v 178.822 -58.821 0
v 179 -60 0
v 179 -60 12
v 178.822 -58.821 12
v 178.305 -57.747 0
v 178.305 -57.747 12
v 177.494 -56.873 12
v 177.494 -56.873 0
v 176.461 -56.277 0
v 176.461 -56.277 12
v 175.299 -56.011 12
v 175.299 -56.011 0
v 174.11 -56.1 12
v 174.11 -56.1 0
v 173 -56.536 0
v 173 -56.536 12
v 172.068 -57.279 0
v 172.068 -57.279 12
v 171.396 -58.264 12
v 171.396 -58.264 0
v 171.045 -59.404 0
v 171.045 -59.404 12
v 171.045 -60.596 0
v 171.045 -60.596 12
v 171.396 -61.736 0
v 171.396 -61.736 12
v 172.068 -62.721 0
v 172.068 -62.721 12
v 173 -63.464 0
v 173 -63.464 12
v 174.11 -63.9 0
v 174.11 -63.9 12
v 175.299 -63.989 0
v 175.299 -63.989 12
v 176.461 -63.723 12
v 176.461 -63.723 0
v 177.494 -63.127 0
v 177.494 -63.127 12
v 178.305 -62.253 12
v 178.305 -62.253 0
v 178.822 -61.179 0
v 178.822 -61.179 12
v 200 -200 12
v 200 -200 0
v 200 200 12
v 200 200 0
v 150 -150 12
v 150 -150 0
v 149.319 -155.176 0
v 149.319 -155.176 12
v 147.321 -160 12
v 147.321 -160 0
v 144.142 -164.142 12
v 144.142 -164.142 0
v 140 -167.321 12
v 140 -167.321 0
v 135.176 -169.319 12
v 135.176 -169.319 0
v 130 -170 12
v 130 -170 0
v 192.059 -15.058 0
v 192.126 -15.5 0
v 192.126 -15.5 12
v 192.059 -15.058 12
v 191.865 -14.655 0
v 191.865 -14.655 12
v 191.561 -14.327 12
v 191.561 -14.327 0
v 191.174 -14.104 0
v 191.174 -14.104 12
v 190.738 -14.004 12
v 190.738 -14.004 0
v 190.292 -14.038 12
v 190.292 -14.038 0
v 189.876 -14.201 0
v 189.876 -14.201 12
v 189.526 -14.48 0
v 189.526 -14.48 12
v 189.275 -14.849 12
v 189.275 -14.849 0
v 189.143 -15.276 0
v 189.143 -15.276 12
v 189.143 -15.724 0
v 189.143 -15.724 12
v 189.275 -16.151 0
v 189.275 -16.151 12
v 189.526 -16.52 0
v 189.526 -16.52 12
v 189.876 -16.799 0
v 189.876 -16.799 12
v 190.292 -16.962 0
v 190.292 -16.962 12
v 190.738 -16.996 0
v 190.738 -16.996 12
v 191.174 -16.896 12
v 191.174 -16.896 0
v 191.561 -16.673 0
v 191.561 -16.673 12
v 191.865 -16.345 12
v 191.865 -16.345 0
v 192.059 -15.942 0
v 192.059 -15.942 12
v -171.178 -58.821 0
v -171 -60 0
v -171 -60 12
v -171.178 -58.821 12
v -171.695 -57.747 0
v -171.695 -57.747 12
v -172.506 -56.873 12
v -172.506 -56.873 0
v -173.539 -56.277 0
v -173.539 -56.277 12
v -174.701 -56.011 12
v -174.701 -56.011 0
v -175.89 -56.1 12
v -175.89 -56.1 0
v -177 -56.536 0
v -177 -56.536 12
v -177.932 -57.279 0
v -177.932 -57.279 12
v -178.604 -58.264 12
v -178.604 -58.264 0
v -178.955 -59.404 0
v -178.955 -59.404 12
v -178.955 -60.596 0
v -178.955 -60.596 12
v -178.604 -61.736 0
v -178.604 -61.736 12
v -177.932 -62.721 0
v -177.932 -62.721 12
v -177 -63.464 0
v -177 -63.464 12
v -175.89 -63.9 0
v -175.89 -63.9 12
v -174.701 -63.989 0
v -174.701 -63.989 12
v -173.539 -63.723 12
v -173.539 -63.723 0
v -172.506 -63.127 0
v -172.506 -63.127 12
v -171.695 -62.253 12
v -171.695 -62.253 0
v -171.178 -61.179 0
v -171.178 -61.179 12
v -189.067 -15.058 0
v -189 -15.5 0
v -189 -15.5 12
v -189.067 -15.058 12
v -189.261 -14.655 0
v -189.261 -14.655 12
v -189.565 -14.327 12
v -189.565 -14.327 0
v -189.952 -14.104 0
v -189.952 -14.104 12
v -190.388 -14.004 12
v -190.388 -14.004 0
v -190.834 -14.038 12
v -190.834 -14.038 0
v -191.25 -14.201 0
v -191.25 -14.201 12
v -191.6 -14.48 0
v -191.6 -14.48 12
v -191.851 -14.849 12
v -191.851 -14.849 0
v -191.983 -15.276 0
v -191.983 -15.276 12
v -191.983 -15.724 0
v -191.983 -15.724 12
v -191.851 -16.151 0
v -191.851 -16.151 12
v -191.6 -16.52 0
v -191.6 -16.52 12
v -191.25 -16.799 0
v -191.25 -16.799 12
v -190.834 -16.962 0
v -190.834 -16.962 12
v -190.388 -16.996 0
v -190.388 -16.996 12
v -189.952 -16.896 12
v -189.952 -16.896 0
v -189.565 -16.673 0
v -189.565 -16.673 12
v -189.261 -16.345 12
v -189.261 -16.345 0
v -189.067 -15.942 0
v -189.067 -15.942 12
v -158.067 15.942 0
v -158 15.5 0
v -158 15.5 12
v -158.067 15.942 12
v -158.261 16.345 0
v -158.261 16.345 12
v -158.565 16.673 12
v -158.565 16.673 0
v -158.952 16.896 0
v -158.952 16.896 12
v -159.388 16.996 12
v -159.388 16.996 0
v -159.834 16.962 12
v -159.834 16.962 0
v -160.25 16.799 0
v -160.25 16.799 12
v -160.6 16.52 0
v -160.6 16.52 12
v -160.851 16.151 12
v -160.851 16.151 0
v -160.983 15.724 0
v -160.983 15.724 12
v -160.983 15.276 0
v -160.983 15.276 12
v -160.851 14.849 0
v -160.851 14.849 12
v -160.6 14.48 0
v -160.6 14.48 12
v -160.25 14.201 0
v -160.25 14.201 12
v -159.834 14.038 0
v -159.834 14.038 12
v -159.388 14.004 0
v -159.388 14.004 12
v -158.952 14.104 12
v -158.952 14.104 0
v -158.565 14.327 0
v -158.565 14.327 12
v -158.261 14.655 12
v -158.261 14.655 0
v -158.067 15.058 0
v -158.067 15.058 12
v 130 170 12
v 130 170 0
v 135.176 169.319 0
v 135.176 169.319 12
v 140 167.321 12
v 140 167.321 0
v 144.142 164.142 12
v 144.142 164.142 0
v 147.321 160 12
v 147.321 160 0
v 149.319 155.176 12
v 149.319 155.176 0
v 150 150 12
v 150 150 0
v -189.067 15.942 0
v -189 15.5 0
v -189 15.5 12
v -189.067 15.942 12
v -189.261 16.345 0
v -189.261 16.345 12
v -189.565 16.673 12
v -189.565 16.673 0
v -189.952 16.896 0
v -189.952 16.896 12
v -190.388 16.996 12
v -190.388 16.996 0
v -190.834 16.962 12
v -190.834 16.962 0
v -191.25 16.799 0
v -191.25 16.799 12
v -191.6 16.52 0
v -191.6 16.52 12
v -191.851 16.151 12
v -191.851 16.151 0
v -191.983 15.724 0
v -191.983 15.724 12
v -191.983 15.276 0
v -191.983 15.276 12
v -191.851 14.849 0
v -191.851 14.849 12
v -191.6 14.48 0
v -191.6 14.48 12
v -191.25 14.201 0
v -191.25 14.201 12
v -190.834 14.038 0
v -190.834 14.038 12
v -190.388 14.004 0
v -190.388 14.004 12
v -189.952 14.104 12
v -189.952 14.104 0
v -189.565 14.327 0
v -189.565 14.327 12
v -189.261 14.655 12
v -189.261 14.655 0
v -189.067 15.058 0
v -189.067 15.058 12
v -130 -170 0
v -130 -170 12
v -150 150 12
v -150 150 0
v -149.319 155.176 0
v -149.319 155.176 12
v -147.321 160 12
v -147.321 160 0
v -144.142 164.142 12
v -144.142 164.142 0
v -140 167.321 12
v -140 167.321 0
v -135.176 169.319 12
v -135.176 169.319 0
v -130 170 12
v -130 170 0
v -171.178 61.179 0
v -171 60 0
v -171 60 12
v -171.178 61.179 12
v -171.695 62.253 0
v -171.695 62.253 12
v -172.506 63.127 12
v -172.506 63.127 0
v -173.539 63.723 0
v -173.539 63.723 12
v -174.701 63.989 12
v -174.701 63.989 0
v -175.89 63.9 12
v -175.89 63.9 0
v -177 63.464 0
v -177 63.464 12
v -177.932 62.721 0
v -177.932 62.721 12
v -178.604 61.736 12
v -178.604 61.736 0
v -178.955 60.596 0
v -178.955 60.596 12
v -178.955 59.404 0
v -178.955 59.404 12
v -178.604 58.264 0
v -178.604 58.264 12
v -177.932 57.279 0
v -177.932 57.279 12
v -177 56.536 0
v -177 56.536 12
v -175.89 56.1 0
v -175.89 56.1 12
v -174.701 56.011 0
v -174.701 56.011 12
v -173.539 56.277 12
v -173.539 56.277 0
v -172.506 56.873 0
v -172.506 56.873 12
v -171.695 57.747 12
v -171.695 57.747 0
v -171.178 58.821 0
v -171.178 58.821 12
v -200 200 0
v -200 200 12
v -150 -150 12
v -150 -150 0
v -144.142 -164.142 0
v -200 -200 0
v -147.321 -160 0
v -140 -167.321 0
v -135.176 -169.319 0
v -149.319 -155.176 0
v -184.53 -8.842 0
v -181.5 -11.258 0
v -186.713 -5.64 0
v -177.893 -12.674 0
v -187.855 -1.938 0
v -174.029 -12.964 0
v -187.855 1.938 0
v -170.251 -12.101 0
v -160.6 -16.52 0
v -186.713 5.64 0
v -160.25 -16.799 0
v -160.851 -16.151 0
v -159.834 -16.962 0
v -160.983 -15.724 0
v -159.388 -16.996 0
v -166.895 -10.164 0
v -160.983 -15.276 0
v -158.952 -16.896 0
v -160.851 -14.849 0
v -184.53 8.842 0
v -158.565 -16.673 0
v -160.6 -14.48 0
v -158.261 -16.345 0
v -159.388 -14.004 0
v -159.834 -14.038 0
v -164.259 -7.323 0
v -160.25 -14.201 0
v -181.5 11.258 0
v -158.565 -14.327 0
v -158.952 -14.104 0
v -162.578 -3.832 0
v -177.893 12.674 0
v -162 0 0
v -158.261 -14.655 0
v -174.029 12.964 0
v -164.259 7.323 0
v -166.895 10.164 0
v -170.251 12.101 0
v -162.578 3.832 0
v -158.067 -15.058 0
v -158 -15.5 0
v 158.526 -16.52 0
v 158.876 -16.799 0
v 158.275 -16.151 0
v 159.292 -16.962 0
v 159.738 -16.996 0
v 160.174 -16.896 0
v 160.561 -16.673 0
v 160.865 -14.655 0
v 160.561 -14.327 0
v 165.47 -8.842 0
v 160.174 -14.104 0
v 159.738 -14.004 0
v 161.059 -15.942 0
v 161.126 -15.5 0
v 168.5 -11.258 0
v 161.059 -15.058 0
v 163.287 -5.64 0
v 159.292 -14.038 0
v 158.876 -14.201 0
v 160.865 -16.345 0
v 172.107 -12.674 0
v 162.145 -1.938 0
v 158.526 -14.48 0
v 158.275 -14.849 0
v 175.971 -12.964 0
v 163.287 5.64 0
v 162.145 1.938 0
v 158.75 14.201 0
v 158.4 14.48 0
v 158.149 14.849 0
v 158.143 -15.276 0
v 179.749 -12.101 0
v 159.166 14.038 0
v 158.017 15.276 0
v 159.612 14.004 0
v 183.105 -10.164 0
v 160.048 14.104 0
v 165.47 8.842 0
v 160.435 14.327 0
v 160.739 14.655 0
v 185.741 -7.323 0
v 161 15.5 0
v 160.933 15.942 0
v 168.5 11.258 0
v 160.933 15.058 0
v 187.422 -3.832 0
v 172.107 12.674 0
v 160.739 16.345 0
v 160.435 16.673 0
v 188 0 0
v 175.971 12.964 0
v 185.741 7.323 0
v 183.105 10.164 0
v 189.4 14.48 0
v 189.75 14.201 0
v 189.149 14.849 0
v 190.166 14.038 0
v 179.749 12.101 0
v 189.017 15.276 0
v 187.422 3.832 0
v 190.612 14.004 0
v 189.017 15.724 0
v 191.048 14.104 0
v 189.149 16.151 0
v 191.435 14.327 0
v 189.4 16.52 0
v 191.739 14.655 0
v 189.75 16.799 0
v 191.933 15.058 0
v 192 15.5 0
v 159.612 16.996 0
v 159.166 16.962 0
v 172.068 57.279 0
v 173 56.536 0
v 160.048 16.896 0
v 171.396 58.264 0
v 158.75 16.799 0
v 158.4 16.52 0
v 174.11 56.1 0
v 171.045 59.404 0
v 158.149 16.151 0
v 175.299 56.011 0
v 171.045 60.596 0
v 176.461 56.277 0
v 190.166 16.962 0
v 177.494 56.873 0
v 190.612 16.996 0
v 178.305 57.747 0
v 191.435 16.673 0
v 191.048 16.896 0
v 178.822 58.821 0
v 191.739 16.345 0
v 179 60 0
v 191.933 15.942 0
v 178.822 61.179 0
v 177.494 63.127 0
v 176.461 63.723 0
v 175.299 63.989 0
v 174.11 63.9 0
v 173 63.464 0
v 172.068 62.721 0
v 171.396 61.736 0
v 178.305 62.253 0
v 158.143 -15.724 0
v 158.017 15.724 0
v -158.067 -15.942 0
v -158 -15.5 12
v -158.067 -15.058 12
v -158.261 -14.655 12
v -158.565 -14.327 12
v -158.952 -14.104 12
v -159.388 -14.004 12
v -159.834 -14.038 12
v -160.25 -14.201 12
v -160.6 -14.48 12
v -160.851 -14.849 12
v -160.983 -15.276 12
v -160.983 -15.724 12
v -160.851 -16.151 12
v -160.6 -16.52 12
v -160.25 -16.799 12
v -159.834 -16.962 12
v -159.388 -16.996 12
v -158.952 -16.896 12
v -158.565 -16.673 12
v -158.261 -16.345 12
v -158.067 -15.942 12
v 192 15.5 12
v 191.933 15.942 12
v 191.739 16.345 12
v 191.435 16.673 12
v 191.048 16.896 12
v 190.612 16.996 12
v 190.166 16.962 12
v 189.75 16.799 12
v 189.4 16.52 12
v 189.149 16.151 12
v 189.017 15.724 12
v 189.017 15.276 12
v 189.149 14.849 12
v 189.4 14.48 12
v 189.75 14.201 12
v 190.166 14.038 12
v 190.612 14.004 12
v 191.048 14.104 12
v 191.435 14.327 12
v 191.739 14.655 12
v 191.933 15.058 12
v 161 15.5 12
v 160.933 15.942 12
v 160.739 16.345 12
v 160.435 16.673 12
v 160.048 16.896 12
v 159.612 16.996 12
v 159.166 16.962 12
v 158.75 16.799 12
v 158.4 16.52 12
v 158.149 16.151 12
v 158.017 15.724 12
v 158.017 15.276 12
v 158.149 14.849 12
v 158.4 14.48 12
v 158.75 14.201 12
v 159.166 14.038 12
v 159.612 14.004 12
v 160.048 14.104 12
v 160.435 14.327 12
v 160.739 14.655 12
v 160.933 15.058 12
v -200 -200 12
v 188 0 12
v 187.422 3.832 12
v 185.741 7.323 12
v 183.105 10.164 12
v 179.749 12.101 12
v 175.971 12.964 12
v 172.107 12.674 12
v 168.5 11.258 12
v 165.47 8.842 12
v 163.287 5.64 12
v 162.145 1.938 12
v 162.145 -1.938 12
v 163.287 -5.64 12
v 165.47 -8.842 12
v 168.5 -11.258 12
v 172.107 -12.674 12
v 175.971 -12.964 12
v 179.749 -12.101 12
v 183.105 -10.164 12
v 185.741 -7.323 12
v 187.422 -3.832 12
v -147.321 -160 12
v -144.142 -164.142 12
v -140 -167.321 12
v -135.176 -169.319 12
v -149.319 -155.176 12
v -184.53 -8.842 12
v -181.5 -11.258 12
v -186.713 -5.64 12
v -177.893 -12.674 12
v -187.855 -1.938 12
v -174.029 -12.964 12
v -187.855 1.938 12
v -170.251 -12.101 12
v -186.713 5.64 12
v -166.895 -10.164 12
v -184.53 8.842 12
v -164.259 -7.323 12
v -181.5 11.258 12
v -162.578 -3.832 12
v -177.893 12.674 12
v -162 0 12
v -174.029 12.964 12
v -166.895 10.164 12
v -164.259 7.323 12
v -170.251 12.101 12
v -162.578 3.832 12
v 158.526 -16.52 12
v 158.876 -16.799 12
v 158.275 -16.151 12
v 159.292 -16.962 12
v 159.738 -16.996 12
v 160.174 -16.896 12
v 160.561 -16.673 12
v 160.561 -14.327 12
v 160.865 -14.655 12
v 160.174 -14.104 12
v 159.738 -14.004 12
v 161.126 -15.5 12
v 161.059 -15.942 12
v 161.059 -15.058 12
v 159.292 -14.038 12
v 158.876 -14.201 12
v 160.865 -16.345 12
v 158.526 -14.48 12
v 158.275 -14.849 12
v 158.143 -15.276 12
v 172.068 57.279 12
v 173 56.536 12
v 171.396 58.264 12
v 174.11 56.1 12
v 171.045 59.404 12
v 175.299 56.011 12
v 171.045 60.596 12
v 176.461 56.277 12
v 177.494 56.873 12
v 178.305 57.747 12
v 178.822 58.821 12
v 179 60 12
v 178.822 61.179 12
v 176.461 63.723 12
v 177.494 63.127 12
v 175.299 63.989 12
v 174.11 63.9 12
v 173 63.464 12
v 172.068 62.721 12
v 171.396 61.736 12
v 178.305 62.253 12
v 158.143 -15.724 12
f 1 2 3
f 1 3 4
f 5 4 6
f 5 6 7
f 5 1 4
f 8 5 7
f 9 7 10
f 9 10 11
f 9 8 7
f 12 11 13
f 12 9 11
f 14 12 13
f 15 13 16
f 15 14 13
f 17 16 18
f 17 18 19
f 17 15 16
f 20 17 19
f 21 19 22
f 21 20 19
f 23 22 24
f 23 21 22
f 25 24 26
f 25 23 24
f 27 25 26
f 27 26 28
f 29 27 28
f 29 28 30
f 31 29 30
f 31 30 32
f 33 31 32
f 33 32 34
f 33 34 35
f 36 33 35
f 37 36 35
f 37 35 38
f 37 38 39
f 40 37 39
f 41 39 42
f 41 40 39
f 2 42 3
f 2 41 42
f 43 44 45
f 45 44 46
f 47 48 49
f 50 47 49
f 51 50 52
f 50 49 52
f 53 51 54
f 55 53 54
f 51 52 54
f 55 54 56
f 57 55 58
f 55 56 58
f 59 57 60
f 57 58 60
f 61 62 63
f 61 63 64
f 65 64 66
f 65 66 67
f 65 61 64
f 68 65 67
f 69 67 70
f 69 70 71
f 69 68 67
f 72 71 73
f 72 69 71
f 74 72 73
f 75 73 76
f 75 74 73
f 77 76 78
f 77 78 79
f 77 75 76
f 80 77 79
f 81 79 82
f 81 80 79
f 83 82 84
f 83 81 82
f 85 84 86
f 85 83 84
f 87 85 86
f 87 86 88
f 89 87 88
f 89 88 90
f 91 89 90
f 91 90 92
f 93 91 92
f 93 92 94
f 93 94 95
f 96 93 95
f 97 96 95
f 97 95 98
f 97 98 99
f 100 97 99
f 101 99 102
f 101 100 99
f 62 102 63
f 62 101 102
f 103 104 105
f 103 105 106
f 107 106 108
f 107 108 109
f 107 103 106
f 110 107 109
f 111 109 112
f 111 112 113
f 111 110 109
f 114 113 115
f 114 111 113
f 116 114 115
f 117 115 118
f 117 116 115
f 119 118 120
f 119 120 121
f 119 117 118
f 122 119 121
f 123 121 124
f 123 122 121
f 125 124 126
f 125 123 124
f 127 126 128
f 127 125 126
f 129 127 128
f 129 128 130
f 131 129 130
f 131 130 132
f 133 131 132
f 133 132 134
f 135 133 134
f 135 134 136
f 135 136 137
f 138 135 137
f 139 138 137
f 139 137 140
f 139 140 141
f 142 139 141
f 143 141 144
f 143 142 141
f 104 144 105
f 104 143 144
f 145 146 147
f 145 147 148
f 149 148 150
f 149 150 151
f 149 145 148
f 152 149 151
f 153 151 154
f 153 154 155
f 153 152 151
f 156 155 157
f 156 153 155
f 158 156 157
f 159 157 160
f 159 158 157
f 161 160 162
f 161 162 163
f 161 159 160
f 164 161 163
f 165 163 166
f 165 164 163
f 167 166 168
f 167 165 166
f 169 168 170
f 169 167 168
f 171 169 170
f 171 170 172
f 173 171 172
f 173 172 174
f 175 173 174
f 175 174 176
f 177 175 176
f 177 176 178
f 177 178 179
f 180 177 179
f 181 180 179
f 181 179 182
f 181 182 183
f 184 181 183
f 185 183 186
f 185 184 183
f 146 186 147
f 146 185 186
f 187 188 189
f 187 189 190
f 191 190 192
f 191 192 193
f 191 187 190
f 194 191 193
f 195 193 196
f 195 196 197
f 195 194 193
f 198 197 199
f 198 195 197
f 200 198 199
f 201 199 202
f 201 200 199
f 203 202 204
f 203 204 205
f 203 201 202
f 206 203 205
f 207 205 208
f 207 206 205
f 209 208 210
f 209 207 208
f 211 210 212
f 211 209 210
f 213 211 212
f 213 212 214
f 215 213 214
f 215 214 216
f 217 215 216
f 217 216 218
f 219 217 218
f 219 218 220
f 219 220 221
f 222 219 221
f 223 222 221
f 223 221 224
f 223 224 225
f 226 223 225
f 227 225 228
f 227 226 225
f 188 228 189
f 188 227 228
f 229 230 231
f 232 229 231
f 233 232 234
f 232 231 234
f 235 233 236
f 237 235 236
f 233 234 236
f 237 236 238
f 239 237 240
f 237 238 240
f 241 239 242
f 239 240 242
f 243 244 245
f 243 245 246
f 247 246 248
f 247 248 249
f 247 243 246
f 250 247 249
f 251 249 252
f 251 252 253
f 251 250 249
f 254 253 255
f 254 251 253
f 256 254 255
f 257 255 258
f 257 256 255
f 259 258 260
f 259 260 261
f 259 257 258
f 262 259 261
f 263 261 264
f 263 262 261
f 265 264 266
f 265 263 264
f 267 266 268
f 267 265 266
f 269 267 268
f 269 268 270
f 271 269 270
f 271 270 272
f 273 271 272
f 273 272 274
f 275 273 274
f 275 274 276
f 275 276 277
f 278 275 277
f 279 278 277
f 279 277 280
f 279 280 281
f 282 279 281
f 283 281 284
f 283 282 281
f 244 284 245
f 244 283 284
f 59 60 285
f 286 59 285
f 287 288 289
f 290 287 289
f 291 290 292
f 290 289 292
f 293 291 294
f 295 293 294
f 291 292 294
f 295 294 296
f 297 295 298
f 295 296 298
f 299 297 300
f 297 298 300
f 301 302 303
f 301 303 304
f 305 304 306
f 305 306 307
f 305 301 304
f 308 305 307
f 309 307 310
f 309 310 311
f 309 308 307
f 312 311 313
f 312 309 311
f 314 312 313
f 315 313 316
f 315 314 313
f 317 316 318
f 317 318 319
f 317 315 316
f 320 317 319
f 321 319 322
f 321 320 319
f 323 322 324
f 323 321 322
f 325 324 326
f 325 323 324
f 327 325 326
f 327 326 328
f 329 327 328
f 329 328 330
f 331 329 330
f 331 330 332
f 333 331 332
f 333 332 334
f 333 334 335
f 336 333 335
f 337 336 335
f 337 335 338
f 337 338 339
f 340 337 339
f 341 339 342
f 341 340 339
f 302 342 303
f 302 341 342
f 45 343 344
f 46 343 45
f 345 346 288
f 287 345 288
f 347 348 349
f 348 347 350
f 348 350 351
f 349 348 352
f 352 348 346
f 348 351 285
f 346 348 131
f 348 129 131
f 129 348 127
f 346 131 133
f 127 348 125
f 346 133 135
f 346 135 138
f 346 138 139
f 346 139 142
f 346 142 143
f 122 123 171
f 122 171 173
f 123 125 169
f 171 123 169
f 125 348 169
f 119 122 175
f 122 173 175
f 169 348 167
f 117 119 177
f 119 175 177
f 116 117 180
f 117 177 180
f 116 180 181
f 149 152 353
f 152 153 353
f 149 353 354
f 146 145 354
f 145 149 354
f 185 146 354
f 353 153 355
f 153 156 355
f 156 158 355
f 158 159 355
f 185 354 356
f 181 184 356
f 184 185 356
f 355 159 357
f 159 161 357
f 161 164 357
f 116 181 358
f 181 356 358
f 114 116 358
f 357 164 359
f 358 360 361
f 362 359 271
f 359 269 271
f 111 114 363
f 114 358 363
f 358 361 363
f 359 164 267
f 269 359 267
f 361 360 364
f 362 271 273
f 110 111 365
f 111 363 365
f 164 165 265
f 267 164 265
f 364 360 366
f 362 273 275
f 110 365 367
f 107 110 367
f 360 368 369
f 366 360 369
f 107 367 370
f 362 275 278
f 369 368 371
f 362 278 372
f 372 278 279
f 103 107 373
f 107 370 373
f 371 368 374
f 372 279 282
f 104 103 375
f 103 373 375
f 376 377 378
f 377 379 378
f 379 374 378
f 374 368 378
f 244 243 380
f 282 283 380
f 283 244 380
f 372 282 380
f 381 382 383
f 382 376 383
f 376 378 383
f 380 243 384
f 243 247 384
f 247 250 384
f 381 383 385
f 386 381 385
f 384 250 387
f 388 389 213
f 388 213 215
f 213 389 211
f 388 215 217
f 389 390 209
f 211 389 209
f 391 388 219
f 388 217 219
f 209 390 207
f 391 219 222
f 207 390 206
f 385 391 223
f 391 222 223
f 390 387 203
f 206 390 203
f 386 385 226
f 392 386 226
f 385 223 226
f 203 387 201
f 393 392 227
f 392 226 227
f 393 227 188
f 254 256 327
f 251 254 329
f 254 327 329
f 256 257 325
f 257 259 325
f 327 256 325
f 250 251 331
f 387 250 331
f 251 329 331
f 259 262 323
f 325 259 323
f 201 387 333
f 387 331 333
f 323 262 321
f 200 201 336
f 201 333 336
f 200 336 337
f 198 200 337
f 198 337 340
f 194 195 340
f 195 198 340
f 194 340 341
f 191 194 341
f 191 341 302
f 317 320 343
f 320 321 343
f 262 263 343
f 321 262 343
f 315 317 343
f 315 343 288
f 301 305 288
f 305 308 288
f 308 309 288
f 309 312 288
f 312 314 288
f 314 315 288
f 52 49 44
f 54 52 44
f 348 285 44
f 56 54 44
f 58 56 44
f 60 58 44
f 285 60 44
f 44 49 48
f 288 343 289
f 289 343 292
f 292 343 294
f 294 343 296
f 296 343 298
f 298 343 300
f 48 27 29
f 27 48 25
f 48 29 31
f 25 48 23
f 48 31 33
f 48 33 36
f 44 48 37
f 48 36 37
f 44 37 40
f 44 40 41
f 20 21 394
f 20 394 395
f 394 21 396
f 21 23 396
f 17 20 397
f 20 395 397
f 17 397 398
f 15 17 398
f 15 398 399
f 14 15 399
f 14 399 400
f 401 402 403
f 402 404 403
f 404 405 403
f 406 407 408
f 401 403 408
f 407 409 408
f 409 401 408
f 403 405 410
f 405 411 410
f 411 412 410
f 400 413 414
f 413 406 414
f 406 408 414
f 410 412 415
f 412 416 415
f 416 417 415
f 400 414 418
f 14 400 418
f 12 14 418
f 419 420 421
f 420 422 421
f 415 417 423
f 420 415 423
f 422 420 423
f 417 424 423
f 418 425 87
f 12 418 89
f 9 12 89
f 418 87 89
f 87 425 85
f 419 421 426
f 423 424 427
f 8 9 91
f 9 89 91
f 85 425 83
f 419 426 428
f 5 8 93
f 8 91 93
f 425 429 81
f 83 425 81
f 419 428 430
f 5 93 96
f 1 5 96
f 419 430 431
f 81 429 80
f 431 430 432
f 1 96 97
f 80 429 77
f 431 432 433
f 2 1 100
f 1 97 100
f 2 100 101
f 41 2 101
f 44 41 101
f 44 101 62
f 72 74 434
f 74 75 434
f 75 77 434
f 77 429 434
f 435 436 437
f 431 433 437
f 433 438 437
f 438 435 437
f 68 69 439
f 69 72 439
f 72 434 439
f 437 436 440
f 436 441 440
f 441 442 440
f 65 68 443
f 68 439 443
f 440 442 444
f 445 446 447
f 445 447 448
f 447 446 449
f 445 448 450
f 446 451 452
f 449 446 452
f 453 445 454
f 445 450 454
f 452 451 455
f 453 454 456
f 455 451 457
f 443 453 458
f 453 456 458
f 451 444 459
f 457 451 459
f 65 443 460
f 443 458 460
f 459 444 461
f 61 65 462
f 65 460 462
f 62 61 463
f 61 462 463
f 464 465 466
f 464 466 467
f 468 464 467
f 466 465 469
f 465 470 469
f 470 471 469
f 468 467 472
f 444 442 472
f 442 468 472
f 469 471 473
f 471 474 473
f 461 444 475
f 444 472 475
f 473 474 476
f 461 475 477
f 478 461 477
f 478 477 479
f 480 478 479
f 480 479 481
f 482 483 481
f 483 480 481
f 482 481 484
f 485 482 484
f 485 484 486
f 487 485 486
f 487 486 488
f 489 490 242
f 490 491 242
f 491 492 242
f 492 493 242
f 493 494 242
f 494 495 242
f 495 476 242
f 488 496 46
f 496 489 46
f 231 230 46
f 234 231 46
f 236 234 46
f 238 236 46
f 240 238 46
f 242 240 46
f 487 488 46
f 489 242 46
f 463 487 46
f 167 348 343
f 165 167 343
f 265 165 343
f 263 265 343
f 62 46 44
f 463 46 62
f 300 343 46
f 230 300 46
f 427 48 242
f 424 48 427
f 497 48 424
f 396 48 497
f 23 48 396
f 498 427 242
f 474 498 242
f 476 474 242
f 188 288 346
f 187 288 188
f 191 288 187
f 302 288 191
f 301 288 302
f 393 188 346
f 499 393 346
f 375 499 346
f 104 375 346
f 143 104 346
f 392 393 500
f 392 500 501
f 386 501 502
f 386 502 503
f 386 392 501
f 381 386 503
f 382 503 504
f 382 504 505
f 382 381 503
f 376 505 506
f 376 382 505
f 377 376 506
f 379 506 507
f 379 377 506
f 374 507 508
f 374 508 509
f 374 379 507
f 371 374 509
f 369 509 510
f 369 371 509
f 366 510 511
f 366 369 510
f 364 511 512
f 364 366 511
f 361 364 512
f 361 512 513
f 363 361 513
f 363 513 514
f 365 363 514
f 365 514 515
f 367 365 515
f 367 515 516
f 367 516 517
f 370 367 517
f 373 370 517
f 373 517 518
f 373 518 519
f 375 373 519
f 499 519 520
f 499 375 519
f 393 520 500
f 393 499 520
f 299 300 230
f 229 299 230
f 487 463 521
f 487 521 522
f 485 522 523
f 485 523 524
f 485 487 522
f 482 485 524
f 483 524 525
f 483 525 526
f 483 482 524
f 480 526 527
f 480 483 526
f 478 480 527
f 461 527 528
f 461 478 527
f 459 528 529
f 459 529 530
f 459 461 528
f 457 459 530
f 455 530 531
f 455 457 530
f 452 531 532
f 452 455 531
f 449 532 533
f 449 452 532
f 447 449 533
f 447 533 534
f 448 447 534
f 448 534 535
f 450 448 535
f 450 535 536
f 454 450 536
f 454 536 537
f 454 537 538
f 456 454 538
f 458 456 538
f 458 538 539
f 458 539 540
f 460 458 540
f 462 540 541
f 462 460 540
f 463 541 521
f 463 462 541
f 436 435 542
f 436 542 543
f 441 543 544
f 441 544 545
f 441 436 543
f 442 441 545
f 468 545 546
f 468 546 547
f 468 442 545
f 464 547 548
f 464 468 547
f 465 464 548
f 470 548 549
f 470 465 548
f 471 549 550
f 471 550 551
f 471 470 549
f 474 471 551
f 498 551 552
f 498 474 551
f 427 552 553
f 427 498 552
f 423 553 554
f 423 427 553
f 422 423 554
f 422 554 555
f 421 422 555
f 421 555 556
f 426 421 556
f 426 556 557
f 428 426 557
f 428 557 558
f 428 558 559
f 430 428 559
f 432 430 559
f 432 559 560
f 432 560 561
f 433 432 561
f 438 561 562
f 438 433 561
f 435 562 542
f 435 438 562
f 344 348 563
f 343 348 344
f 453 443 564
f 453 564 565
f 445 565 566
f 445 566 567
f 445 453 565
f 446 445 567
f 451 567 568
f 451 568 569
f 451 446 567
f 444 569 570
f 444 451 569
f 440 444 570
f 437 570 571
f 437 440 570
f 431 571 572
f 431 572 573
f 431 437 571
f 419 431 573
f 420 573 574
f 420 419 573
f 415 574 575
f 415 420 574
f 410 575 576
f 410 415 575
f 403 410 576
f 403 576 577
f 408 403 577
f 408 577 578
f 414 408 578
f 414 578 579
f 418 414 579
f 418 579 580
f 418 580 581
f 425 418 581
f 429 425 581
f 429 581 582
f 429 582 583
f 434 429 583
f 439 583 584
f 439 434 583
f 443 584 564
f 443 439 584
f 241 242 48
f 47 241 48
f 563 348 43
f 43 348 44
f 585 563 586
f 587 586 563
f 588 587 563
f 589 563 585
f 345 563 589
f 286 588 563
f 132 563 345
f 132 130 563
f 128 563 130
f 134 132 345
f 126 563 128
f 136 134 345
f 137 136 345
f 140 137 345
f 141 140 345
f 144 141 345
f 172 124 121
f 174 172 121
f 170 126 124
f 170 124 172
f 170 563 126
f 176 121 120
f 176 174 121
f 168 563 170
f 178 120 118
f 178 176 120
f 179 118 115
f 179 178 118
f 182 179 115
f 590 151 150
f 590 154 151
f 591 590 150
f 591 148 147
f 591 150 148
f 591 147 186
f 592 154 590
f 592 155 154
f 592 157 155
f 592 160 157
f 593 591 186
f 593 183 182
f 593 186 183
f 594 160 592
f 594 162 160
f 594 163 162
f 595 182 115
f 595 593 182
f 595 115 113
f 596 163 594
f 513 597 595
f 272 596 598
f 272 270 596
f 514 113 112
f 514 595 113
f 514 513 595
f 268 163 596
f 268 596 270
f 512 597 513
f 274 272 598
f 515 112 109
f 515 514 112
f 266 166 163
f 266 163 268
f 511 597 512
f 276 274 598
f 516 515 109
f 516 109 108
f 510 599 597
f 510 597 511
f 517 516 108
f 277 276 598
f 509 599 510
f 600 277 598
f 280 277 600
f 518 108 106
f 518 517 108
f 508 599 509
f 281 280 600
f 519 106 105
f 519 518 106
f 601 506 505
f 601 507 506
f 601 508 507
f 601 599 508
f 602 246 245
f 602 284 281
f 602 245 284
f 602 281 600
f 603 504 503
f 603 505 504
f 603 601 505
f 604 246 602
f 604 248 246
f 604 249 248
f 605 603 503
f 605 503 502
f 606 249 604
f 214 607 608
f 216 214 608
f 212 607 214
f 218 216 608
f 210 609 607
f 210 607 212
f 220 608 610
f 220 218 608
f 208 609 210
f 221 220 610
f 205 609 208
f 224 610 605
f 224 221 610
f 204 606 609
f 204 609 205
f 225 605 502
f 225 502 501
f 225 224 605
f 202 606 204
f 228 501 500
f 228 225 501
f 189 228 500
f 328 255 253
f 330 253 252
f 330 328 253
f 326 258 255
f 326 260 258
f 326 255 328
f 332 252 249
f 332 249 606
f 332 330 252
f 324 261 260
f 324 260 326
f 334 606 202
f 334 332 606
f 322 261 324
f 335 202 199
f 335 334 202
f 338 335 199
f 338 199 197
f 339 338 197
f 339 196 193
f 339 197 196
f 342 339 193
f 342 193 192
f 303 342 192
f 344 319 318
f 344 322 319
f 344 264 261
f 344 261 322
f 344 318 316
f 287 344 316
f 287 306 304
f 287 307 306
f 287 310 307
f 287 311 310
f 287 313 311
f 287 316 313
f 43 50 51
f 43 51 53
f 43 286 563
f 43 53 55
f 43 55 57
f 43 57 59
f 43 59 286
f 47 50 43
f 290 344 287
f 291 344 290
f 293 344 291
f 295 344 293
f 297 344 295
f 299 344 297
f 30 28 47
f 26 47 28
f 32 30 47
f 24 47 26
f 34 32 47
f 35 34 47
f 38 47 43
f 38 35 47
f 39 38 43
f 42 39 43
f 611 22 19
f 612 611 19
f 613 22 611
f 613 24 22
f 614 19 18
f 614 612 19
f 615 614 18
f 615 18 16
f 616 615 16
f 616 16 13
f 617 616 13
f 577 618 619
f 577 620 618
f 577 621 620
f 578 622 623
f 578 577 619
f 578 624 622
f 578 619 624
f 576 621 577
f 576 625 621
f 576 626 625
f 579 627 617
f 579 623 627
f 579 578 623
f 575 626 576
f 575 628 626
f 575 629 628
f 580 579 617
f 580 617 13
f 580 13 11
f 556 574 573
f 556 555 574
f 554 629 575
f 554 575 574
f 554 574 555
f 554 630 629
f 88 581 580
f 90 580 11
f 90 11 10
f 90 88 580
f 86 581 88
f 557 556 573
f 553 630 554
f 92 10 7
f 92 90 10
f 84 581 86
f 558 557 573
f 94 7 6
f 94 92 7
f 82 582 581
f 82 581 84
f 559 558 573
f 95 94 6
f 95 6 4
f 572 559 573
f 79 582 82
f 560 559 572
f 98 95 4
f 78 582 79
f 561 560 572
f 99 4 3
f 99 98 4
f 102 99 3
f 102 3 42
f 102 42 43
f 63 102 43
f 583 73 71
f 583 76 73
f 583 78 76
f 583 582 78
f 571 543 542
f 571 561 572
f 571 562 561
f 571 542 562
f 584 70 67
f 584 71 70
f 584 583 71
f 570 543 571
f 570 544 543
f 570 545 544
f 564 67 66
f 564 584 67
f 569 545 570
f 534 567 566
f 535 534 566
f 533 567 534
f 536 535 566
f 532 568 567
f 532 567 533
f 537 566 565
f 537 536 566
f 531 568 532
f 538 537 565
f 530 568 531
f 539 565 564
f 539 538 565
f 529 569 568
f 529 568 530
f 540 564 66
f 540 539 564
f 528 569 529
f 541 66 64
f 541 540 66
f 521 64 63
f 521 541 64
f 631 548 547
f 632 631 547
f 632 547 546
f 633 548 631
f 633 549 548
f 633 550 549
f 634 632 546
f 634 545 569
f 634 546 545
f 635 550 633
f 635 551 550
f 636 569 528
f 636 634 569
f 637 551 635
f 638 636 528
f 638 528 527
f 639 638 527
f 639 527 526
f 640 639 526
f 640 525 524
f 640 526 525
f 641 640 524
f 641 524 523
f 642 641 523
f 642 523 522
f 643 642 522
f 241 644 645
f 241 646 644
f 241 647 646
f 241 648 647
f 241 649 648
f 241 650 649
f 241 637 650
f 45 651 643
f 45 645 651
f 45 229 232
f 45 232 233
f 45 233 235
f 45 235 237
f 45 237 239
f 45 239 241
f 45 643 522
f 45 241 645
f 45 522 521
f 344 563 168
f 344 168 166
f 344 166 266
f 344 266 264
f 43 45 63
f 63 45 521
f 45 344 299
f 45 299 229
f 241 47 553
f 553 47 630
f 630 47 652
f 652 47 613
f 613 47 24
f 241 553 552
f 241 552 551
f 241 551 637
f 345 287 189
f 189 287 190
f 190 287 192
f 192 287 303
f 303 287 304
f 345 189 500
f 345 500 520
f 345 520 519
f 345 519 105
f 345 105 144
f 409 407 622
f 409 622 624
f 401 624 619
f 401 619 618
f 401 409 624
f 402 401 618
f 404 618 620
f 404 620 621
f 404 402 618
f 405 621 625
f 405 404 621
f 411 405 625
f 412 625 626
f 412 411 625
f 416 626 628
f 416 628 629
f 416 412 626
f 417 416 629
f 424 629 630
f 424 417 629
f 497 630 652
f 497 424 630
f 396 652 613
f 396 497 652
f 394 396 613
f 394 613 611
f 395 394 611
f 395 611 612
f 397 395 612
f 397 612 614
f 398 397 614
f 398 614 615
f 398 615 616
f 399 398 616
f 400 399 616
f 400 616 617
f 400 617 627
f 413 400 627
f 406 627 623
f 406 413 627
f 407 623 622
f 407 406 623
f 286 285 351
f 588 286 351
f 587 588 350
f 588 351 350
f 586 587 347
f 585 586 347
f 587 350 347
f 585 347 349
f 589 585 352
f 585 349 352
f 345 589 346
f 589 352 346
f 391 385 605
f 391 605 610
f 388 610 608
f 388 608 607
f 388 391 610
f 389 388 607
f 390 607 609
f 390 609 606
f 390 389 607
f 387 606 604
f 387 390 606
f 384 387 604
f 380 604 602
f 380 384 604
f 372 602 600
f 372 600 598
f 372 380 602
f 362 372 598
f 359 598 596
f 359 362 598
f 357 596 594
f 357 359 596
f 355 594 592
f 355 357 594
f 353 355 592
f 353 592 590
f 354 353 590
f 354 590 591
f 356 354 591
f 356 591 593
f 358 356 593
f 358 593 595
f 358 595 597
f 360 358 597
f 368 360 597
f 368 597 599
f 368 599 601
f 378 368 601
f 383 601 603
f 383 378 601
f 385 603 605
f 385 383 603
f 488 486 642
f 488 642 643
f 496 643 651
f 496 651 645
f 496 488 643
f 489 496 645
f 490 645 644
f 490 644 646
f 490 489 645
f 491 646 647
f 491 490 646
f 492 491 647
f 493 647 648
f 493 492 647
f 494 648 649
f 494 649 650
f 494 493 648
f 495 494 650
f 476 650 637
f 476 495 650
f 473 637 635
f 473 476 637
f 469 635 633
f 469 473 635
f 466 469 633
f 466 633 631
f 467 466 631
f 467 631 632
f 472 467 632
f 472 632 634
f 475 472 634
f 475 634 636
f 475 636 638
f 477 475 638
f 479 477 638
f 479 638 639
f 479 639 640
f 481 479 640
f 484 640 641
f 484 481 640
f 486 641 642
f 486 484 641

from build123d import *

# Parameters (mm, degrees)
F0_W     = 400
F0_H     = 400
F0_R     = 4
F0_R_2   = 1.5
F0_R_3   = 13
F1_DEPTH = 12


with BuildPart() as f1:
    # F0 (on Top) → F1 (new body)
    with BuildSketch(Plane.XY):
        Rectangle(F0_W, F0_H)
        with Locations((-175, -60)):
            Circle(F0_R, mode=Mode.SUBTRACT)
        with Locations((-190.5, -15.5)):
            Circle(F0_R_2, mode=Mode.SUBTRACT)
        with Locations((-159.5, -15.5)):
            Circle(F0_R_2, mode=Mode.SUBTRACT)
        with Locations((175, -60)):
            Circle(F0_R, mode=Mode.SUBTRACT)
        with Locations((159.626022, -15.5)):
            Circle(F0_R_2, mode=Mode.SUBTRACT)
        with Locations((190.626022, -15.5)):
            Circle(F0_R_2, mode=Mode.SUBTRACT)
        with Locations((-190.5, 15.5)):
            Circle(F0_R_2, mode=Mode.SUBTRACT)
        with Locations((-175, 0)):
            Circle(F0_R_3, mode=Mode.SUBTRACT)
        with Locations((-159.5, 15.5)):
            Circle(F0_R_2, mode=Mode.SUBTRACT)
        with Locations((-175, 60)):
            Circle(F0_R, mode=Mode.SUBTRACT)
        with BuildLine():
            Line((-130, 170), (130, 170))
            ThreePointArc((130, 170), (144.142136, 164.142136), (150, 150))
            Line((150, 150), (150, -150))
            ThreePointArc((150, -150), (144.142136, -164.142136), (130, -170))
            Line((130, -170), (-130, -170))
            ThreePointArc((-130, -170), (-144.142136, -164.142136), (-150, -150))
            Line((-150, -150), (-150, 150))
            ThreePointArc((-150, 150), (-144.142136, 164.142136), (-130, 170))
        make_face(mode=Mode.SUBTRACT)
        with Locations((159.5, 15.5)):
            Circle(F0_R_2, mode=Mode.SUBTRACT)
        with Locations((175, 0)):
            Circle(F0_R_3, mode=Mode.SUBTRACT)
        with Locations((190.5, 15.5)):
            Circle(F0_R_2, mode=Mode.SUBTRACT)
        with Locations((175, 60)):
            Circle(F0_R, mode=Mode.SUBTRACT)
    extrude(amount=F1_DEPTH)


solid = f1.part
